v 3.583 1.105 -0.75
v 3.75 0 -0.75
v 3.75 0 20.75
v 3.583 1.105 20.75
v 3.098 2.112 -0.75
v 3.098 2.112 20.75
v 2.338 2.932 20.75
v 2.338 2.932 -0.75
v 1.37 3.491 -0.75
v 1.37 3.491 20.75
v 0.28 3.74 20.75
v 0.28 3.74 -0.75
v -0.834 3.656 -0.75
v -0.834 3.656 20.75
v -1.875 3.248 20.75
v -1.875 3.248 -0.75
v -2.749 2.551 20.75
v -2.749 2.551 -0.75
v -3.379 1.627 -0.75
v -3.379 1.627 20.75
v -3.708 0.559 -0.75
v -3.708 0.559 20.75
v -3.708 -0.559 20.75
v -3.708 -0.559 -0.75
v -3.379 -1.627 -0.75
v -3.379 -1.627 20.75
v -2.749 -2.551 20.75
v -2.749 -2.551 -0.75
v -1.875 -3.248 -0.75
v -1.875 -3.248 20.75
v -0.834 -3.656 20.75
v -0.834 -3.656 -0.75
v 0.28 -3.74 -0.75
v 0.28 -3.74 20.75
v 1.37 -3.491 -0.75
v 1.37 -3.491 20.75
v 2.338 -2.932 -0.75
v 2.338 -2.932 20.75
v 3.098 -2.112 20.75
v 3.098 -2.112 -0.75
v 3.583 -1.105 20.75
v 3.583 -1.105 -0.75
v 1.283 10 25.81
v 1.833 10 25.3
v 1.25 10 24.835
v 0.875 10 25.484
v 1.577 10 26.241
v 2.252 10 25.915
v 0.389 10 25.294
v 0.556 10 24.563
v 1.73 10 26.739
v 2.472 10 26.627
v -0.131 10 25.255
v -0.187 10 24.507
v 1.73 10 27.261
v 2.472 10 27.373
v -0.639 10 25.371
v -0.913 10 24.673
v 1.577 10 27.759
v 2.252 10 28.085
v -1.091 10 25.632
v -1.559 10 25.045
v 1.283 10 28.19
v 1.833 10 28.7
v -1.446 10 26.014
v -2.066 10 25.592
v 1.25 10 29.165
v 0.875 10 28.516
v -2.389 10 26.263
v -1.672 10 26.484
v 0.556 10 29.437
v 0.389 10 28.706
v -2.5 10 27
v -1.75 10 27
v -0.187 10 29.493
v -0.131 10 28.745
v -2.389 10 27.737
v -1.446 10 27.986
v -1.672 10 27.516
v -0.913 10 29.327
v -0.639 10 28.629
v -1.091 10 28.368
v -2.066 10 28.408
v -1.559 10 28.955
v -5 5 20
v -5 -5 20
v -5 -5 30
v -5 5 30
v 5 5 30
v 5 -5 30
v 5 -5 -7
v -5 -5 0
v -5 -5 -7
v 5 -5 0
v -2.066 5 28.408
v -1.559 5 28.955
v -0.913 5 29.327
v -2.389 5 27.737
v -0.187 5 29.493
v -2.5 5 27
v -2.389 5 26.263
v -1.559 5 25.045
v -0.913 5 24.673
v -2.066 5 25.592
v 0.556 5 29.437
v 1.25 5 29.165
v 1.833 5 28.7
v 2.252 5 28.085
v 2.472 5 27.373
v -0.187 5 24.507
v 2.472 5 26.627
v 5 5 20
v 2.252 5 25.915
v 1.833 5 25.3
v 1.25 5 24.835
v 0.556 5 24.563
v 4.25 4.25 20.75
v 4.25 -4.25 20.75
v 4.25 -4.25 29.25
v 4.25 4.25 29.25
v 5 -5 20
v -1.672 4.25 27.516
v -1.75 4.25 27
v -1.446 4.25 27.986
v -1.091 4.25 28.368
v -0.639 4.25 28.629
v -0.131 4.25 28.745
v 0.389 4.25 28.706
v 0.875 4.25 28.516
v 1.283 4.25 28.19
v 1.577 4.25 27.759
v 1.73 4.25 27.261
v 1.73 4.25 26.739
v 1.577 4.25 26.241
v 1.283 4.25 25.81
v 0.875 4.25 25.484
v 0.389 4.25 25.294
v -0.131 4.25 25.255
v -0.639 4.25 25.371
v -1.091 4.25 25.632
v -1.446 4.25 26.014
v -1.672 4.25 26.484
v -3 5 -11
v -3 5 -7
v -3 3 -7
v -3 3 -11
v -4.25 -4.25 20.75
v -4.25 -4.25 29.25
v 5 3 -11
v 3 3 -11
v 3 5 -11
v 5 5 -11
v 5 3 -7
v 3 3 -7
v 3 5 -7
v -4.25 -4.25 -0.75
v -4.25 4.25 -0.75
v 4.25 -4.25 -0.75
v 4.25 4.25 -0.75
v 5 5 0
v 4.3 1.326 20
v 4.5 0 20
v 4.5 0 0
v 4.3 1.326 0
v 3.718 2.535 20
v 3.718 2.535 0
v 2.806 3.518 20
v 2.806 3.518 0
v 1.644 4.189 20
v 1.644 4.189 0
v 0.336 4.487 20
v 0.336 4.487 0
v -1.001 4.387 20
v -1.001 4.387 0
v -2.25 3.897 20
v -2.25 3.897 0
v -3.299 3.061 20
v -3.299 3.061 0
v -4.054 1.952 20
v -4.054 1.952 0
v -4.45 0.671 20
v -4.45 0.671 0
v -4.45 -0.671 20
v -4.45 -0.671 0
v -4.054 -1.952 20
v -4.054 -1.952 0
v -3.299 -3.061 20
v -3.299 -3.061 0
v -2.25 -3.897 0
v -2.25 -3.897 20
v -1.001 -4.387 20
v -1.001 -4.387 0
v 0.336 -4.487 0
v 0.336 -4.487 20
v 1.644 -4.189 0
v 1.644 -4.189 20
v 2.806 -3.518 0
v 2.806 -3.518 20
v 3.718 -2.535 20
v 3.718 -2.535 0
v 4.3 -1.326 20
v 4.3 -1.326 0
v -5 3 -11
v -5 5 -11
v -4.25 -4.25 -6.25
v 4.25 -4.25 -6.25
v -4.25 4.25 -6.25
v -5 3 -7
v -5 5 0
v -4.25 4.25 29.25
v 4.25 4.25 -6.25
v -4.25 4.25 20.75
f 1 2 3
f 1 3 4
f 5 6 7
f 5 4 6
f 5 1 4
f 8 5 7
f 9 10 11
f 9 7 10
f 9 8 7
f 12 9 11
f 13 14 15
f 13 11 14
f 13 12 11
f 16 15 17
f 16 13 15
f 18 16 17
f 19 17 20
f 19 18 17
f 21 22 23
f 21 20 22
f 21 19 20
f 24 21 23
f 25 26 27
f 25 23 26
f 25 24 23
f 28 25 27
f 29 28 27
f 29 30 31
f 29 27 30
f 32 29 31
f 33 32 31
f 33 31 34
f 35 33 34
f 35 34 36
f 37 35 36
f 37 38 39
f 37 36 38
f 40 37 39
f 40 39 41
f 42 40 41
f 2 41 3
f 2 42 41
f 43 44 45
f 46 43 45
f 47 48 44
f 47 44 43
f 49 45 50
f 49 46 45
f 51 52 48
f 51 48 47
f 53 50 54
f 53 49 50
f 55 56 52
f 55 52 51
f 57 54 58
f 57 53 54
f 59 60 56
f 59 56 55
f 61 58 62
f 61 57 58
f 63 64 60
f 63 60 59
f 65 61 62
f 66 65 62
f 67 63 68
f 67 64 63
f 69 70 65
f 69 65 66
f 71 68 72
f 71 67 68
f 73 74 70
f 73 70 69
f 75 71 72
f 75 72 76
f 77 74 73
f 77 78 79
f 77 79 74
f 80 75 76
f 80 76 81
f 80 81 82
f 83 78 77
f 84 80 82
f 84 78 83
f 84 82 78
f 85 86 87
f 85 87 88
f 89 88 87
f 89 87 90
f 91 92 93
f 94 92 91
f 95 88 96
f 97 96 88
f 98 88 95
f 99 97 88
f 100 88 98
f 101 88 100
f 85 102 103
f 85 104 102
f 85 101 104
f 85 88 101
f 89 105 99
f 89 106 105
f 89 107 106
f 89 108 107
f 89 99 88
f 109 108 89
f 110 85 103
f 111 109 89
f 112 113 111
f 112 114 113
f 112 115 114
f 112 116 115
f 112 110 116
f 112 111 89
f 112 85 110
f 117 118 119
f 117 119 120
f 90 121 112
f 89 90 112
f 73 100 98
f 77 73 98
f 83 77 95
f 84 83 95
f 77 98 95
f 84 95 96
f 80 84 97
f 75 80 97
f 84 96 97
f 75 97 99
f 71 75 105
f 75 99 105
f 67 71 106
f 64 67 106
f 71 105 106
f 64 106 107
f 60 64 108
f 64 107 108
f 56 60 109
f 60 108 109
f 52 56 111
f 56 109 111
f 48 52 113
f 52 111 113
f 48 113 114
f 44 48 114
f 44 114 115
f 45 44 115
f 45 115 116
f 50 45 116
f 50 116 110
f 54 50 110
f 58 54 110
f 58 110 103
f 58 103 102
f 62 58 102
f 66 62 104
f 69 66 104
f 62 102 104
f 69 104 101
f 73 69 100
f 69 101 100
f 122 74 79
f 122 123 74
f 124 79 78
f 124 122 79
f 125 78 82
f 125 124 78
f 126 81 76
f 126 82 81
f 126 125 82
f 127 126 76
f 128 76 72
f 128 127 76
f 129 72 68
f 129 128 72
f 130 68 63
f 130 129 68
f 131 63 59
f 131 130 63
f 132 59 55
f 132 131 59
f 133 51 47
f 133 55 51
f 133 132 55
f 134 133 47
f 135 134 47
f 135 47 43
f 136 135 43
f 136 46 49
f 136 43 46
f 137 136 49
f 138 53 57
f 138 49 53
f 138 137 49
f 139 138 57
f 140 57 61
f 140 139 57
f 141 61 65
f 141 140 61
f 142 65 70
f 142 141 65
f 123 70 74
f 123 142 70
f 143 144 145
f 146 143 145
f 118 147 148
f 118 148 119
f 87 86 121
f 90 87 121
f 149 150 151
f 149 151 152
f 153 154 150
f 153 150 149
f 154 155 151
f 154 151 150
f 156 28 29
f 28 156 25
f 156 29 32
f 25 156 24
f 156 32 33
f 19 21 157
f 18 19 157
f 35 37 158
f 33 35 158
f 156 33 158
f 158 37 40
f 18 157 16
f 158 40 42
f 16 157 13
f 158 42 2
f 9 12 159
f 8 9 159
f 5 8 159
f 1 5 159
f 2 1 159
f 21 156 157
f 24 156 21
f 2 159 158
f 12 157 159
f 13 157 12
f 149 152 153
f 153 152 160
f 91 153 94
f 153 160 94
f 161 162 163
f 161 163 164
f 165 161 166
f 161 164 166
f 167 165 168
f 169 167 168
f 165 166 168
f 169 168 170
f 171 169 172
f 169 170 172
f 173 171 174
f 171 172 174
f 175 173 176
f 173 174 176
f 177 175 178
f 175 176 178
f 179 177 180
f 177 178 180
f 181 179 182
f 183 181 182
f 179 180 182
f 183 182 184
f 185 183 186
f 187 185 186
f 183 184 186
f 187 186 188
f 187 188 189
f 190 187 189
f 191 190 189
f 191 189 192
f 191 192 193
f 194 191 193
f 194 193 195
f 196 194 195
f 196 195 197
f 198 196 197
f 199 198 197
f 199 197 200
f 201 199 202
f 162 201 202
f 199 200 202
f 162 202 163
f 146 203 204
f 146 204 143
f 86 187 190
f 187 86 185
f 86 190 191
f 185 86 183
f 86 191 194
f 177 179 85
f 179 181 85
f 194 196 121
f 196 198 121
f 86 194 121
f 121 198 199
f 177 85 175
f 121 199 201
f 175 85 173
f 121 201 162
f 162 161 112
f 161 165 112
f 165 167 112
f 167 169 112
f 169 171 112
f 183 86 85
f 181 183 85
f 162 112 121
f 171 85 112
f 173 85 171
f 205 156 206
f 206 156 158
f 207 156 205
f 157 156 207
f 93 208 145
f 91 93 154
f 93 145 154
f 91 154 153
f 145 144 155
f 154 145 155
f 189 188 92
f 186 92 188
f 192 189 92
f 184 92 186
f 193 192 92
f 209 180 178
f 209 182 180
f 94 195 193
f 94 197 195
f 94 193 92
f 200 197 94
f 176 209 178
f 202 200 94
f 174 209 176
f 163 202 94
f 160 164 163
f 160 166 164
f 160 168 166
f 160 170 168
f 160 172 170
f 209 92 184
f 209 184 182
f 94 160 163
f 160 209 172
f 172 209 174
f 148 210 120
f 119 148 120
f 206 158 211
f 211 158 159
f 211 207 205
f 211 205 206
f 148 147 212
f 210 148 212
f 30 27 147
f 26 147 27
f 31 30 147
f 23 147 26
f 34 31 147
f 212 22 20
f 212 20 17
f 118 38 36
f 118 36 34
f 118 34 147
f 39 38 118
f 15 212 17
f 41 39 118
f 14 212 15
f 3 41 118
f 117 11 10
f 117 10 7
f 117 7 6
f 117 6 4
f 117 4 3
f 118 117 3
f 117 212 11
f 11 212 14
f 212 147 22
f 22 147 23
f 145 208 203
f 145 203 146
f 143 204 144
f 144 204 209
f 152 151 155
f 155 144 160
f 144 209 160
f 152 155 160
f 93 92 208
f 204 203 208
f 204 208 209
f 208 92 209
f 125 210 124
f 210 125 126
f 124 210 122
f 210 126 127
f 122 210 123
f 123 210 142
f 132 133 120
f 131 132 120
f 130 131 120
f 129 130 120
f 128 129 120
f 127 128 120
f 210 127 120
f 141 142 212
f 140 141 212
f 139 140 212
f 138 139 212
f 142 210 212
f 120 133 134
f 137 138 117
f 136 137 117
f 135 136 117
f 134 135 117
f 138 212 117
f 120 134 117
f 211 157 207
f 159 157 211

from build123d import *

# Parameters (mm, degrees)
F0_R      = 4.5
F1_DEPTH  = 20
F0_W      = 10
F0_H      = 10
F2_DEPTH  = 7
F4_W      = 10
F4_H      = 10
F5_DEPTH  = 10
F6_R      = 2.5
F7_DEPTH  = 5
F8_T      = -0.75
F9_W      = 2
F9_H      = 2
F10_DEPTH = 4


with BuildPart() as f1:
    # F0 (on Top) → F1 (new body)
    with BuildSketch(Plane.XY):
        Circle(F0_R)
    extrude(amount=F1_DEPTH)

    # F0 (on Top) → F2 (join)
    with BuildSketch(Plane.XY):
        Rectangle(F0_W, F0_H)
        Circle(F0_R, mode=Mode.SUBTRACT)
        Circle(F0_R)
    extrude(amount=-F2_DEPTH)

    # F4 (on offset) → F5 (join)
    with BuildSketch(Plane.XY.offset(20)):
        Rectangle(F4_W, F4_H)
    extrude(amount=F5_DEPTH)

    # F6 (on face) → F7 (join)
    with BuildSketch(Plane(origin=(0, 5, 0), x_dir=(-1, 0, 0), z_dir=(0, 1, 0))):
        with Locations((0, 27)):
            Circle(F6_R)
    extrude(amount=F7_DEPTH)

    # F8
    f8_openings = [f1.faces().sort_by_distance(p)[0] for p in [
        (0, 10, 27),
    ]]
    offset(amount=F8_T, openings=f8_openings, kind=Kind.INTERSECTION)

    # F9 (on face) → F10 (join)
    with BuildSketch(Plane(origin=(0, 0, -7), x_dir=(1, 0, 0), z_dir=(0, 0, -1))):
        with Locations((4, -4)):
            Rectangle(F9_W, F9_H)
        with Locations((-4, -4)):
            Rectangle(F9_W, F9_H)
    extrude(amount=F10_DEPTH)


solid = f1.part
